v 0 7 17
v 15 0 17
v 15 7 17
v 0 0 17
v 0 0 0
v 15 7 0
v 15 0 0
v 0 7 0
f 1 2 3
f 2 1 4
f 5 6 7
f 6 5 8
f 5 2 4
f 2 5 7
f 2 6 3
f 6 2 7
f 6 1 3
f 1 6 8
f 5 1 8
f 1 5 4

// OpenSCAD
// Generated by SolidPython 1.0.1 on 2020-07-29 00:46:55


cube(size = [15, 7, 17]);
/***********************************************
*********      SolidPython code:      **********
************************************************
 
# import packages: SolidPython
from solid import *
from solid.utils import *
from itertools import chain, combinations, permutations


class Resize:

    def __init__(self, scad_file):
        self.scad_file = scad_file
        #self.scad_file = import_scad(scad_file)
        # cone/cylinder param:
        self.r1 = 0
        self.r2 = 0
        self.h = 0
        # rectangular prism param:
        self.w = 0
        self.l = 0
        # ellipse param:
        self.r = 0

    # import OpenScad code (file name corresponds to shape)


    # classify shape + parameters
    def assign(self, param1, param2, param3):
        if self.scad_file == 'cone.scad':
            self.r1 = param1
            self.r2 = param2
            self.h = param3
        elif self.scad_file == 'cylinder.scad':
            self.r1 = param1
            self.r2 = param2
            self.h = param3
        elif self.scad_file == 'rectangularPrism.scad':
            self.h = param1
            self.l = param2
            self.w = param3
        else:
            self.r = param1
            self.h = param2

    # resize parameters
    def iterate(self):
        x = range(3, 20, 2)
        i = 1
        if self.scad_file == 'cone.scad':
            tempList = list(permutations(x, 2))
            for temp in tempList:
                param1 = temp[0]
                param2 = temp[1]
                filepath = 'produced_scad_files/' + 'cone' + str(param1) + '_' + str(param2) + '_' + '.scad'
                scad_render_to_file(cylinder(h=param1, r1=param2, r2=0), filepath)

        elif self.scad_file == 'cylinder.scad':
            tempList = list(permutations(x, 3))
            for temp in tempList:
                param1 = temp[0]
                param2 = temp[1]
                filepath = 'produced_scad_files/' + 'cylinder' + str(param1) + '_' + str(param2) + '_' + '.scad'
                scad_render_to_file(cylinder(h=param1, r1=param2, r2=param2), filepath)

        elif self.scad_file == 'rectangularPrism.scad':
            tempList = list(permutations(x, 3))
            for temp in tempList:
                param1 = temp[0]
                param2 = temp[1]
                param3 = temp[2]
                filepath = 'produced_scad_files/' + 'rectangularPrism' + str(param1) + '_' + str(param2) + '_' + str(
                    param3) + '.scad'
                scad_render_to_file(cube(size=(param1, param2, param3)), filepath)

        elif self.scad_file == 'ellipse.scad':
            tempList = list(permutations(x, 4))
            for temp in tempList:
                param1 = temp[0]
                param2 = temp[1]
                param3 = temp[2]
                param4 = temp[3]
                filepath = 'produced_scad_files/' + 'ellipse' + str(param1) + '_' + str(param2) + '_' + str(param3) + '_' + str(param4) + '.scad'
                scad_render_to_file(scale([param1, param2, param3])(sphere(r=param4)), filepath)

    def render_to_scadfile(self):
        scad_render_to_file(scad, 'example.scad') 
 
************************************************/
